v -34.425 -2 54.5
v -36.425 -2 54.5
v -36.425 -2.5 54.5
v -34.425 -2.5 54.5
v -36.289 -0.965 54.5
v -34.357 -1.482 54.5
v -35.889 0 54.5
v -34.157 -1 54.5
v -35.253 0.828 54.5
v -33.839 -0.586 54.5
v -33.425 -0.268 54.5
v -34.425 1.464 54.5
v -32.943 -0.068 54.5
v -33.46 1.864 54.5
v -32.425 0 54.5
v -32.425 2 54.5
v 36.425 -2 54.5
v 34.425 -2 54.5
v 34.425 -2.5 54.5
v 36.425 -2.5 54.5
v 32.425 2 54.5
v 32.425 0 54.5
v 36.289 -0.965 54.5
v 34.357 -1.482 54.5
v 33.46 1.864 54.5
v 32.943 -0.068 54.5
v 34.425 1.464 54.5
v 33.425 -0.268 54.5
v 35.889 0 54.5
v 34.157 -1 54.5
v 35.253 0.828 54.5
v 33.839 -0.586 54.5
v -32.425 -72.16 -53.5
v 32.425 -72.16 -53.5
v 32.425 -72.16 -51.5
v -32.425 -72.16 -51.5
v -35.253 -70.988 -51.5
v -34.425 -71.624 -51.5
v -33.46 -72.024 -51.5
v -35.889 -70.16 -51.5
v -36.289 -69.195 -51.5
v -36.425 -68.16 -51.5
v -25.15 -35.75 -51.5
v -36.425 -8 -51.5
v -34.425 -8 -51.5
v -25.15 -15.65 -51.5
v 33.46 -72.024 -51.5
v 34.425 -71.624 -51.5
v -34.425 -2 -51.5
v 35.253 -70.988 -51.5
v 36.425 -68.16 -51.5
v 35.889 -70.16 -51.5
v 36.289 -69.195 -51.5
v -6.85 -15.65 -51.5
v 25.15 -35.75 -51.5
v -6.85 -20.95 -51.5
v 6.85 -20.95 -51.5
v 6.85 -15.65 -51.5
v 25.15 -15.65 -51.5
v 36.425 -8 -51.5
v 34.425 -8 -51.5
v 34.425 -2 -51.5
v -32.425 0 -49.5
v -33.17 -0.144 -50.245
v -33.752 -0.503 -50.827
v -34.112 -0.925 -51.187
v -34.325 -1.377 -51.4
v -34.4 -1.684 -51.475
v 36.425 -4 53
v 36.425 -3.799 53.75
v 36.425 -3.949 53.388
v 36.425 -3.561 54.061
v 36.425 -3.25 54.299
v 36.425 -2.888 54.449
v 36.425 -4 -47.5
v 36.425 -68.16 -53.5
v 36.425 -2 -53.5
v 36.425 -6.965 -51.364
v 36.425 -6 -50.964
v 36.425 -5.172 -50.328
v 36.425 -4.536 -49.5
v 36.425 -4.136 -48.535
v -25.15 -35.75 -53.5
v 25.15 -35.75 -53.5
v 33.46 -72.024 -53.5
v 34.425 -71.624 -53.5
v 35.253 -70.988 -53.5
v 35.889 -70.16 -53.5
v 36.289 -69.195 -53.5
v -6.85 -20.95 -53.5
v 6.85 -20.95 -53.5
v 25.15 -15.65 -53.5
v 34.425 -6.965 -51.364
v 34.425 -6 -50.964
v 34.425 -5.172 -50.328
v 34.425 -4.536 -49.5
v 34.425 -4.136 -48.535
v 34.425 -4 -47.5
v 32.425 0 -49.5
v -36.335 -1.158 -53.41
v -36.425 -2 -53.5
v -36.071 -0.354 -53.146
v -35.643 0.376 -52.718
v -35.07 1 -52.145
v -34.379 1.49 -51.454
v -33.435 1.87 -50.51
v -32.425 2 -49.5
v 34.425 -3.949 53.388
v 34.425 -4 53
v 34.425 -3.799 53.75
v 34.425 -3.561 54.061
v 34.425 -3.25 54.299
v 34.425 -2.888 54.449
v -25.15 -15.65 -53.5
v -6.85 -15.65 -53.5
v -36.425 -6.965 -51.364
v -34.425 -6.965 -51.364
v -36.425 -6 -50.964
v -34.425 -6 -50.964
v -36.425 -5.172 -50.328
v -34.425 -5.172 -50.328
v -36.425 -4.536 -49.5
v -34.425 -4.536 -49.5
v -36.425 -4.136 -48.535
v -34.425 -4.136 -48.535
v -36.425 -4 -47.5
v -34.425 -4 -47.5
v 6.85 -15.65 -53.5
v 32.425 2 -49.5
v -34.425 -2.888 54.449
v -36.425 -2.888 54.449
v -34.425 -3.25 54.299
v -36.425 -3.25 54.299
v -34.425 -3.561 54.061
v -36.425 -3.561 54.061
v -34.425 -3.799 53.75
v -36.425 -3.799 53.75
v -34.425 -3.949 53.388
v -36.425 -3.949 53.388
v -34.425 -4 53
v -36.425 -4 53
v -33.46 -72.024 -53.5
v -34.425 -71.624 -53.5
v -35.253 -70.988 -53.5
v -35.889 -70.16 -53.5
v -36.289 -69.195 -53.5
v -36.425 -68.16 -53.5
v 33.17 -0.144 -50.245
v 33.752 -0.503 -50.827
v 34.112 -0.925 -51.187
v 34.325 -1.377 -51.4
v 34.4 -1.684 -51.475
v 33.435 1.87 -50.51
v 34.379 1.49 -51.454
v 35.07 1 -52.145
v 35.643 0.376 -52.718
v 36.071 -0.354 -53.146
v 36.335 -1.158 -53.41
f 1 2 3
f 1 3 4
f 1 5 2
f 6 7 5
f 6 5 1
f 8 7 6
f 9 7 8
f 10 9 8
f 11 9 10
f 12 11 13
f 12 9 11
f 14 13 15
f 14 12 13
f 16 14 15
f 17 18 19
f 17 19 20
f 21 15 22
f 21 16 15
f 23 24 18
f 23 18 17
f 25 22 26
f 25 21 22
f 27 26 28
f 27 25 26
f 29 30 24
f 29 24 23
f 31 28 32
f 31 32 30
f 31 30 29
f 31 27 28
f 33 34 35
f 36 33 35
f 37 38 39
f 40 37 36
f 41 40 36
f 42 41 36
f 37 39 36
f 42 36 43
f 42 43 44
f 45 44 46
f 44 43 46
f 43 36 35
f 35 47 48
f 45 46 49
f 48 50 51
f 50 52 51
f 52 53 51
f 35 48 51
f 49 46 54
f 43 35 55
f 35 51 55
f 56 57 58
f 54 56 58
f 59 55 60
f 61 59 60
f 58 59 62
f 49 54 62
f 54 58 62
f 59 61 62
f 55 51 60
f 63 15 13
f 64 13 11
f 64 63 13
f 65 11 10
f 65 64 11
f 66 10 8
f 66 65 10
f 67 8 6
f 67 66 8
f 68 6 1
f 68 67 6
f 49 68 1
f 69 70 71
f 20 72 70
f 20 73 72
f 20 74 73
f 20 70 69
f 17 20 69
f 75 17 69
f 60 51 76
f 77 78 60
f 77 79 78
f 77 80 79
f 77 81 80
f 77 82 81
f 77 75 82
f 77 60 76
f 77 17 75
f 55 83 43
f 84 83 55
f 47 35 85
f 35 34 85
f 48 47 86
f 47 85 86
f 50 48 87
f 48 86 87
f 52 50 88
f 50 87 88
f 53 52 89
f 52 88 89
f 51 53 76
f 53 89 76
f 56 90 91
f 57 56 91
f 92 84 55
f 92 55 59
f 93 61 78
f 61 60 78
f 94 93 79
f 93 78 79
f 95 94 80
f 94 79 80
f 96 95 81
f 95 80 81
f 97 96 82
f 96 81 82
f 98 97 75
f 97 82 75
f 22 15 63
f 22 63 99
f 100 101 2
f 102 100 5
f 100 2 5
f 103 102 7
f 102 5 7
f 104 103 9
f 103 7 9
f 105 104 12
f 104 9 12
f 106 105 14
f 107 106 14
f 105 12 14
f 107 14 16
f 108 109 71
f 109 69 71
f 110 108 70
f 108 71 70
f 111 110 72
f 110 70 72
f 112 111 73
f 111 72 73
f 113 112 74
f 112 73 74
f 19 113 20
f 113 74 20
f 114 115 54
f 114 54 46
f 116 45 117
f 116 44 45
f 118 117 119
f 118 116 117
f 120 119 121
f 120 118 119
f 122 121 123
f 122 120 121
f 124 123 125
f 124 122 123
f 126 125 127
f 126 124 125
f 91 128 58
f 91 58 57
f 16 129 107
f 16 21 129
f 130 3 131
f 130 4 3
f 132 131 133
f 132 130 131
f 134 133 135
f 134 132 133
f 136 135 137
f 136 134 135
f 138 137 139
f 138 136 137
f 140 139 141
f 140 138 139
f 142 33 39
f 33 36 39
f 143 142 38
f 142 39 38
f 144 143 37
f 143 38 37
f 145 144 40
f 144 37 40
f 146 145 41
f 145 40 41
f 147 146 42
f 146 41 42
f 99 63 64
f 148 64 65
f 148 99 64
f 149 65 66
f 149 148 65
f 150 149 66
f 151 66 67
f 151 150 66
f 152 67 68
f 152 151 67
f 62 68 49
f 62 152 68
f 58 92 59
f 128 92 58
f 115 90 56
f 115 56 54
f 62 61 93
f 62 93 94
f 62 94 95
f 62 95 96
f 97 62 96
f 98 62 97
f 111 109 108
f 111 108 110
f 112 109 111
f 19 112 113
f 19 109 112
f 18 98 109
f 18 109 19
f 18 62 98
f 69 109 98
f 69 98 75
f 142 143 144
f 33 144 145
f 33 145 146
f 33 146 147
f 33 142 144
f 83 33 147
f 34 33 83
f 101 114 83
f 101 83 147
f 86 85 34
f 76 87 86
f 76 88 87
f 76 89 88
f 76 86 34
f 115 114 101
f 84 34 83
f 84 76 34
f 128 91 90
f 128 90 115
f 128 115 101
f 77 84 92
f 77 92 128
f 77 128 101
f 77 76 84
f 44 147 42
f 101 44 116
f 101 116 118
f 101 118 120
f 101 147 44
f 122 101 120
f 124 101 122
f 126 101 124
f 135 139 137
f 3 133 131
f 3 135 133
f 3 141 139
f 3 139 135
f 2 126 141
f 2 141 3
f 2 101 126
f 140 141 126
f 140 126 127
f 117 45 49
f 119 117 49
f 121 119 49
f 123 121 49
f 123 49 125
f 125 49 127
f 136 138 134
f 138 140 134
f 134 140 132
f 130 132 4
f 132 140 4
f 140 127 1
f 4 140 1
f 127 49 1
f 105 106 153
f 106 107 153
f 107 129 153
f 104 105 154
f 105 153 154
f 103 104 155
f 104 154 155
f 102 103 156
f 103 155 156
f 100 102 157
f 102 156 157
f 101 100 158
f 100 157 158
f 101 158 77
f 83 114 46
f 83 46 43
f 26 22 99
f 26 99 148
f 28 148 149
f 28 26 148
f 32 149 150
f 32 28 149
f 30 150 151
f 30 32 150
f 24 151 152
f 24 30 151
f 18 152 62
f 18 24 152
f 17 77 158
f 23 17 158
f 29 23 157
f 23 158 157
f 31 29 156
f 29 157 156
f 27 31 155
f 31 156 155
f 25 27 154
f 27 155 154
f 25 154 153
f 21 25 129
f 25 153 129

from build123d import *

# Parameters (mm, degrees)
SKETCH1_W            = 68.85
SKETCH1_H            = 107
BOSS_EXTRUDE1_DEPTH  = 2
SKETCH2_W            = 68.85
SKETCH2_H            = 2
BOSS_EXTRUDE2_DEPTH  = 67
CUT_EXTRUDE2_REACH   = 132.855
SKETCH5_W            = 68.85
SKETCH5_H            = 2
BOSS_EXTRUDE3_DEPTH  = 51
SKETCH6_W            = 68.85
SKETCH6_H            = 2
BOSS_EXTRUDE4_DEPTH  = 20.36
BOSS_EXTRUDE5_DEPTH  = 1.5
SKETCH13_W           = 2
SKETCH13_H           = 1.5
BOSS_EXTRUDE8_DEPTH  = 3
CUT_EXTRUDE4_REACH   = 97.75
SKETCH9_R            = 1.75
FILLET1_R            = 1.5
FILLET2_R            = 3
FILLET3_R            = 1.5
FILLET4_R            = 3
CUT_EXTRUDE5_REACH   = 111.975
SKETCH10_R           = 1.75
CHAMFER1_SIZE        = 2
SKETCH11_W           = 2
SKETCH11_H           = 109
BOSS_EXTRUDE6_DEPTH  = 4.5
SKETCH14_W           = 68.85
SKETCH14_H           = 0.5
BOSS_EXTRUDE9_DEPTH  = 2
FILLET5_R            = 2
FILLET6_R            = 4
FILLET8_R            = 4
CUT_EXTRUDE6_DEPTH   = 1
CUT_EXTRUDE7_DEPTH   = 125.986967721
SKETCH17_W           = 68.85
SKETCH17_H           = 2
BOSS_EXTRUDE10_DEPTH = 8.66
SKETCH18_W           = 2
SKETCH18_H           = 68.16
BOSS_EXTRUDE11_DEPTH = 2
SKETCH19_W           = 2
SKETCH19_H           = 68.16
BOSS_EXTRUDE12_DEPTH = 2
FILLET9_R            = 4
FILLET10_R           = 4
FILLET11_R           = 1.5


with BuildPart() as part:
    # Sketch1 → Boss-Extrude1 (new body)
    with BuildSketch(Plane(origin=(0, 0, 0), x_dir=(1, 0, 0), z_dir=(0, 1, 0))):
        Rectangle(SKETCH1_W, SKETCH1_H)
    extrude(amount=BOSS_EXTRUDE1_DEPTH)

    # Sketch2 → Boss-Extrude2 (add)
    with BuildSketch(Plane.XZ):
        with Locations((0, -52.5)):
            Rectangle(SKETCH2_W, SKETCH2_H)
    extrude(amount=BOSS_EXTRUDE2_DEPTH)

    # Sketch4 → Cut-Extrude2 (cut, up to next)
    with BuildSketch(Plane(origin=(0, 0, -53.5), x_dir=(-1, 0, 0), z_dir=(0, 0, -1)), mode=Mode.PRIVATE) as cut_extrude2_sk1:
        Polygon((-6.85, -15.65), (-6.85, -20.95), (-5.325, -20.95), (6.85, -20.95), (6.85, -15.65), (25.15, -15.65), (25.15, -35.75), (-25.15, -35.75), (-25.15, -15.65), align=None)
    cut_extrude2_tool1 = extrude(cut_extrude2_sk1.sketch, amount=-CUT_EXTRUDE2_REACH, mode=Mode.PRIVATE) & part.part
    add(cut_extrude2_tool1.solids().sort_by_distance((0, -26.272573, -53.5))[0], mode=Mode.SUBTRACT)

    # Sketch5 → Boss-Extrude3 (add)
    with BuildSketch(Plane.XY.offset(-51.5)):
        with Locations((0, -66)):
            Rectangle(SKETCH5_W, SKETCH5_H)
    extrude(amount=BOSS_EXTRUDE3_DEPTH)

    # Sketch6 → Boss-Extrude4 (add)
    with BuildSketch(Plane.XZ.offset(67)):
        with Locations((0, -1.5)):
            Rectangle(SKETCH6_W, SKETCH6_H)
    extrude(amount=BOSS_EXTRUDE4_DEPTH)

    # Sketch8 → Boss-Extrude5 (add)
    with BuildSketch(Plane(origin=(0, 2, 0), x_dir=(1, 0, 0), z_dir=(0, 1, 0))):
        Polygon((-36.425, 50.5), (-34.425, 50.5), (-34.425, -53.5), (34.425, -53.5), (34.425, 50.5), (36.425, 50.5), (36.425, -55.5), (-36.425, -55.5), align=None)
    extrude(amount=-BOSS_EXTRUDE5_DEPTH)

    # Sketch13 → Boss-Extrude8 (add)
    with BuildSketch(Plane(origin=(0, 0, -50.5), x_dir=(-1, 0, 0), z_dir=(0, 0, -1))):
        with Locations((35.425, 1.25)):
            Rectangle(SKETCH13_W, SKETCH13_H)
        with Locations((-35.425, 1.25)):
            Rectangle(SKETCH13_W, SKETCH13_H)
    extrude(amount=BOSS_EXTRUDE8_DEPTH)

    # Sketch9 → Cut-Extrude4 (cut, up to next)
    with BuildSketch(Plane.XZ.offset(67), mode=Mode.PRIVATE) as cut_extrude4_sk1:
        with Locations(Location((-25, -23.48, 0), (0, 0, 270))):
            Circle(SKETCH9_R)
    cut_extrude4_tool1 = extrude(cut_extrude4_sk1.sketch, amount=-CUT_EXTRUDE4_REACH, mode=Mode.PRIVATE) & part.part
    # Sketch9 → Cut-Extrude4 (cut, up to next)
    with BuildSketch(Plane.XZ.offset(67), mode=Mode.PRIVATE) as cut_extrude4_sk2:
        with Locations(Location((25, -23.48, 0), (0, 0, 270))):
            Circle(SKETCH9_R)
    cut_extrude4_tool2 = extrude(cut_extrude4_sk2.sketch, amount=-CUT_EXTRUDE4_REACH, mode=Mode.PRIVATE) & part.part
    add(cut_extrude4_tool1.solids().sort_by_distance((-25, -67, -23.48))[0], mode=Mode.SUBTRACT)
    add(cut_extrude4_tool2.solids().sort_by_distance((25, -67, -23.48))[0], mode=Mode.SUBTRACT)

    # Fillet1
    fillet1_edges = [part.edges().sort_by_distance(p)[0] for p in [
        (0, -67, -2.5),
    ]]
    fillet(fillet1_edges, radius=FILLET1_R)

    # Fillet2
    fillet2_edges = [part.edges().sort_by_distance(p)[0] for p in [
        (0, -65, -0.5),
    ]]
    fillet(fillet2_edges, radius=FILLET2_R)

    # Fillet3
    fillet3_edges = [part.edges().sort_by_distance(p)[0] for p in [
        (0, -65, -51.5),
    ]]
    fillet(fillet3_edges, radius=FILLET3_R)

    # Fillet4
    fillet4_edges = [part.edges().sort_by_distance(p)[0] for p in [
        (0, -67, -53.5),
    ]]
    fillet(fillet4_edges, radius=FILLET4_R)

    # Sketch10 → Cut-Extrude5 (cut, up to next)
    with BuildSketch(Plane.XY.offset(-0.5), mode=Mode.PRIVATE) as cut_extrude5_sk1:
        with Locations((-24.425, -79.36)):
            Circle(SKETCH10_R)
    cut_extrude5_tool1 = extrude(cut_extrude5_sk1.sketch, amount=-CUT_EXTRUDE5_REACH, mode=Mode.PRIVATE) & part.part
    # Sketch10 → Cut-Extrude5 (cut, up to next)
    with BuildSketch(Plane.XY.offset(-0.5), mode=Mode.PRIVATE) as cut_extrude5_sk2:
        with Locations((24.425, -79.36)):
            Circle(SKETCH10_R)
    cut_extrude5_tool2 = extrude(cut_extrude5_sk2.sketch, amount=-CUT_EXTRUDE5_REACH, mode=Mode.PRIVATE) & part.part
    add(cut_extrude5_tool1.solids().sort_by_distance((-24.425, -79.36, -0.5))[0], mode=Mode.SUBTRACT)
    add(cut_extrude5_tool2.solids().sort_by_distance((24.425, -79.36, -0.5))[0], mode=Mode.SUBTRACT)

    # Chamfer1
    chamfer1_edges = [part.edges().sort_by_distance(p)[0] for p in [
        (-34.425, -87.36, -1.5),
        (34.425, -87.36, -1.5),
    ]]
    chamfer(chamfer1_edges, length=CHAMFER1_SIZE)

    # Sketch11 → Boss-Extrude6 (add)
    with BuildSketch(Plane.XZ.offset(-0.5)):
        with Locations((35.425, 1)):
            Rectangle(SKETCH11_W, SKETCH11_H)
        with Locations((-35.425, 1)):
            Rectangle(SKETCH11_W, SKETCH11_H)
    extrude(amount=BOSS_EXTRUDE6_DEPTH)

    # Sketch14 → Boss-Extrude9 (add)
    with BuildSketch(Plane.XY.offset(53.5)):
        with Locations((0, 0.25)):
            Rectangle(SKETCH14_W, SKETCH14_H)
    extrude(amount=BOSS_EXTRUDE9_DEPTH)

    # Fillet5
    fillet5_edges = [part.edges().sort_by_distance(p)[0] for p in [
        (0, 0, -51.5),
        (34.425, 0, 2),
        (-34.425, 0, 2),
    ]]
    fillet(fillet5_edges, radius=FILLET5_R)

    # Fillet6
    fillet6_edges = [part.edges().sort_by_distance(p)[0] for p in [
        (0, 2, -53.5),
    ]]
    fillet(fillet6_edges, radius=FILLET6_R)

    # Fillet8
    # the kernel refuses this fillet: 4 mm, written as the material it takes off along each edge
    with BuildSketch(Plane(origin=(-36.425, 2, 65.5), x_dir=(1, 0, 0), z_dir=(0, 0, -1))) as fillet8_piece_1:
        with BuildLine():
            CenterArc((FILLET8_R, FILLET8_R), FILLET8_R, 180, 90)
            Line((0, FILLET8_R), (0, 0))
            Line((0, 0), (FILLET8_R, 0))
        make_face()
    extrude(amount=125, mode=Mode.SUBTRACT)
    with BuildSketch(Plane(origin=(36.425, 2, -59.5), x_dir=(0, -1, 0), z_dir=(0, 0, 1))) as fillet8_piece_2:
        with BuildLine():
            CenterArc((FILLET8_R, -FILLET8_R), FILLET8_R, 90, 90)
            Line((0, -FILLET8_R), (0, 0))
            Line((0, 0), (FILLET8_R, 0))
        make_face()
    extrude(amount=125, mode=Mode.SUBTRACT)

    # Sketch15 → Cut-Extrude6 (cut)
    with BuildSketch(Plane.XY.offset(55.5)):
        with BuildLine():
            Line((-36.425, -2), (-36.425, -4))
            Line((-36.425, -4), (-34.425, -4))
            Line((-34.425, -4), (-34.425, -2))
            ThreePointArc((-34.425, -2), (-33.839213562, -0.585786438), (-32.425, 0))
            Line((-32.425, 0), (32.425, 0))
            ThreePointArc((32.425, 0), (33.839213562, -0.585786438), (34.425, -2))
            Line((34.425, -2), (34.425, -4))
            Line((34.425, -4), (36.425, -4))
            Line((36.425, -4), (36.425, -2))
            ThreePointArc((36.425, -2), (35.253427125, 0.828427125), (32.425, 2))
            Line((32.425, 2), (-32.425, 2))
            ThreePointArc((-32.425, 2), (-35.253427125, 0.828427125), (-36.425, -2))
        make_face()
    extrude(amount=-CUT_EXTRUDE6_DEPTH, mode=Mode.SUBTRACT)

    # Sketch16 → Cut-Extrude7 (cut, through all)
    with BuildSketch(Plane(origin=(34.425, 0, 0), x_dir=(0, 0, -1), z_dir=(1, 0, 0))):
        with BuildLine():
            Line((2.5, -87.36), (0.5, -87.36))
            Line((0.5, -87.36), (0.5, -68))
            ThreePointArc((0.5, -68), (1.378679656, -65.878679656), (3.5, -65))
            Line((3.5, -65), (50, -65))
            ThreePointArc((50, -65), (51.060660172, -64.560660172), (51.5, -63.5))
            Line((51.5, -63.5), (53.5, -63.5))
            Line((53.5, -63.5), (53.5, -64))
            ThreePointArc((53.5, -64), (52.621320344, -66.121320344), (50.5, -67))
            Line((50.5, -67), (4, -67))
            ThreePointArc((4, -67), (2.939339828, -67.439339828), (2.5, -68.5))
            Line((2.5, -68.5), (2.5, -87.36))
        make_face()
    extrude(amount=-CUT_EXTRUDE7_DEPTH, mode=Mode.SUBTRACT)

    # Sketch17 → Boss-Extrude10 (add)
    with BuildSketch(Plane.XZ.offset(63.5)):
        with Locations((0, -52.5)):
            Rectangle(SKETCH17_W, SKETCH17_H)
    extrude(amount=BOSS_EXTRUDE10_DEPTH)

    # Sketch18 → Boss-Extrude11 (add)
    with BuildSketch(Plane(origin=(34.425, 0, 0), x_dir=(0, 0, -1), z_dir=(1, 0, 0))):
        with Locations((52.5, -38.08)):
            Rectangle(SKETCH18_W, SKETCH18_H)
    extrude(amount=BOSS_EXTRUDE11_DEPTH)

    # Sketch19 → Boss-Extrude12 (add)
    with BuildSketch(Plane.ZY.offset(34.425)):
        with Locations((-52.5, -38.08)):
            Rectangle(SKETCH19_W, SKETCH19_H)
    extrude(amount=BOSS_EXTRUDE12_DEPTH)

    # Fillet9
    fillet9_edges = [part.edges().sort_by_distance(p)[0] for p in [
        (36.425, -72.16, -52.5),
        (-36.425, -72.16, -52.5),
    ]]
    fillet(fillet9_edges, radius=FILLET9_R)

    # Fillet10
    fillet10_edges = [part.edges().sort_by_distance(p)[0] for p in [
        (35.425, -4, -51.5),
        (-35.425, -4, -51.5),
    ]]
    fillet(fillet10_edges, radius=FILLET10_R)

    # Fillet11
    fillet11_edges = [part.edges().sort_by_distance(p)[0] for p in [
        (35.425, -4, 54.5),
        (-35.425, -4, 54.5),
    ]]
    fillet(fillet11_edges, radius=FILLET11_R)


solid = part.part
